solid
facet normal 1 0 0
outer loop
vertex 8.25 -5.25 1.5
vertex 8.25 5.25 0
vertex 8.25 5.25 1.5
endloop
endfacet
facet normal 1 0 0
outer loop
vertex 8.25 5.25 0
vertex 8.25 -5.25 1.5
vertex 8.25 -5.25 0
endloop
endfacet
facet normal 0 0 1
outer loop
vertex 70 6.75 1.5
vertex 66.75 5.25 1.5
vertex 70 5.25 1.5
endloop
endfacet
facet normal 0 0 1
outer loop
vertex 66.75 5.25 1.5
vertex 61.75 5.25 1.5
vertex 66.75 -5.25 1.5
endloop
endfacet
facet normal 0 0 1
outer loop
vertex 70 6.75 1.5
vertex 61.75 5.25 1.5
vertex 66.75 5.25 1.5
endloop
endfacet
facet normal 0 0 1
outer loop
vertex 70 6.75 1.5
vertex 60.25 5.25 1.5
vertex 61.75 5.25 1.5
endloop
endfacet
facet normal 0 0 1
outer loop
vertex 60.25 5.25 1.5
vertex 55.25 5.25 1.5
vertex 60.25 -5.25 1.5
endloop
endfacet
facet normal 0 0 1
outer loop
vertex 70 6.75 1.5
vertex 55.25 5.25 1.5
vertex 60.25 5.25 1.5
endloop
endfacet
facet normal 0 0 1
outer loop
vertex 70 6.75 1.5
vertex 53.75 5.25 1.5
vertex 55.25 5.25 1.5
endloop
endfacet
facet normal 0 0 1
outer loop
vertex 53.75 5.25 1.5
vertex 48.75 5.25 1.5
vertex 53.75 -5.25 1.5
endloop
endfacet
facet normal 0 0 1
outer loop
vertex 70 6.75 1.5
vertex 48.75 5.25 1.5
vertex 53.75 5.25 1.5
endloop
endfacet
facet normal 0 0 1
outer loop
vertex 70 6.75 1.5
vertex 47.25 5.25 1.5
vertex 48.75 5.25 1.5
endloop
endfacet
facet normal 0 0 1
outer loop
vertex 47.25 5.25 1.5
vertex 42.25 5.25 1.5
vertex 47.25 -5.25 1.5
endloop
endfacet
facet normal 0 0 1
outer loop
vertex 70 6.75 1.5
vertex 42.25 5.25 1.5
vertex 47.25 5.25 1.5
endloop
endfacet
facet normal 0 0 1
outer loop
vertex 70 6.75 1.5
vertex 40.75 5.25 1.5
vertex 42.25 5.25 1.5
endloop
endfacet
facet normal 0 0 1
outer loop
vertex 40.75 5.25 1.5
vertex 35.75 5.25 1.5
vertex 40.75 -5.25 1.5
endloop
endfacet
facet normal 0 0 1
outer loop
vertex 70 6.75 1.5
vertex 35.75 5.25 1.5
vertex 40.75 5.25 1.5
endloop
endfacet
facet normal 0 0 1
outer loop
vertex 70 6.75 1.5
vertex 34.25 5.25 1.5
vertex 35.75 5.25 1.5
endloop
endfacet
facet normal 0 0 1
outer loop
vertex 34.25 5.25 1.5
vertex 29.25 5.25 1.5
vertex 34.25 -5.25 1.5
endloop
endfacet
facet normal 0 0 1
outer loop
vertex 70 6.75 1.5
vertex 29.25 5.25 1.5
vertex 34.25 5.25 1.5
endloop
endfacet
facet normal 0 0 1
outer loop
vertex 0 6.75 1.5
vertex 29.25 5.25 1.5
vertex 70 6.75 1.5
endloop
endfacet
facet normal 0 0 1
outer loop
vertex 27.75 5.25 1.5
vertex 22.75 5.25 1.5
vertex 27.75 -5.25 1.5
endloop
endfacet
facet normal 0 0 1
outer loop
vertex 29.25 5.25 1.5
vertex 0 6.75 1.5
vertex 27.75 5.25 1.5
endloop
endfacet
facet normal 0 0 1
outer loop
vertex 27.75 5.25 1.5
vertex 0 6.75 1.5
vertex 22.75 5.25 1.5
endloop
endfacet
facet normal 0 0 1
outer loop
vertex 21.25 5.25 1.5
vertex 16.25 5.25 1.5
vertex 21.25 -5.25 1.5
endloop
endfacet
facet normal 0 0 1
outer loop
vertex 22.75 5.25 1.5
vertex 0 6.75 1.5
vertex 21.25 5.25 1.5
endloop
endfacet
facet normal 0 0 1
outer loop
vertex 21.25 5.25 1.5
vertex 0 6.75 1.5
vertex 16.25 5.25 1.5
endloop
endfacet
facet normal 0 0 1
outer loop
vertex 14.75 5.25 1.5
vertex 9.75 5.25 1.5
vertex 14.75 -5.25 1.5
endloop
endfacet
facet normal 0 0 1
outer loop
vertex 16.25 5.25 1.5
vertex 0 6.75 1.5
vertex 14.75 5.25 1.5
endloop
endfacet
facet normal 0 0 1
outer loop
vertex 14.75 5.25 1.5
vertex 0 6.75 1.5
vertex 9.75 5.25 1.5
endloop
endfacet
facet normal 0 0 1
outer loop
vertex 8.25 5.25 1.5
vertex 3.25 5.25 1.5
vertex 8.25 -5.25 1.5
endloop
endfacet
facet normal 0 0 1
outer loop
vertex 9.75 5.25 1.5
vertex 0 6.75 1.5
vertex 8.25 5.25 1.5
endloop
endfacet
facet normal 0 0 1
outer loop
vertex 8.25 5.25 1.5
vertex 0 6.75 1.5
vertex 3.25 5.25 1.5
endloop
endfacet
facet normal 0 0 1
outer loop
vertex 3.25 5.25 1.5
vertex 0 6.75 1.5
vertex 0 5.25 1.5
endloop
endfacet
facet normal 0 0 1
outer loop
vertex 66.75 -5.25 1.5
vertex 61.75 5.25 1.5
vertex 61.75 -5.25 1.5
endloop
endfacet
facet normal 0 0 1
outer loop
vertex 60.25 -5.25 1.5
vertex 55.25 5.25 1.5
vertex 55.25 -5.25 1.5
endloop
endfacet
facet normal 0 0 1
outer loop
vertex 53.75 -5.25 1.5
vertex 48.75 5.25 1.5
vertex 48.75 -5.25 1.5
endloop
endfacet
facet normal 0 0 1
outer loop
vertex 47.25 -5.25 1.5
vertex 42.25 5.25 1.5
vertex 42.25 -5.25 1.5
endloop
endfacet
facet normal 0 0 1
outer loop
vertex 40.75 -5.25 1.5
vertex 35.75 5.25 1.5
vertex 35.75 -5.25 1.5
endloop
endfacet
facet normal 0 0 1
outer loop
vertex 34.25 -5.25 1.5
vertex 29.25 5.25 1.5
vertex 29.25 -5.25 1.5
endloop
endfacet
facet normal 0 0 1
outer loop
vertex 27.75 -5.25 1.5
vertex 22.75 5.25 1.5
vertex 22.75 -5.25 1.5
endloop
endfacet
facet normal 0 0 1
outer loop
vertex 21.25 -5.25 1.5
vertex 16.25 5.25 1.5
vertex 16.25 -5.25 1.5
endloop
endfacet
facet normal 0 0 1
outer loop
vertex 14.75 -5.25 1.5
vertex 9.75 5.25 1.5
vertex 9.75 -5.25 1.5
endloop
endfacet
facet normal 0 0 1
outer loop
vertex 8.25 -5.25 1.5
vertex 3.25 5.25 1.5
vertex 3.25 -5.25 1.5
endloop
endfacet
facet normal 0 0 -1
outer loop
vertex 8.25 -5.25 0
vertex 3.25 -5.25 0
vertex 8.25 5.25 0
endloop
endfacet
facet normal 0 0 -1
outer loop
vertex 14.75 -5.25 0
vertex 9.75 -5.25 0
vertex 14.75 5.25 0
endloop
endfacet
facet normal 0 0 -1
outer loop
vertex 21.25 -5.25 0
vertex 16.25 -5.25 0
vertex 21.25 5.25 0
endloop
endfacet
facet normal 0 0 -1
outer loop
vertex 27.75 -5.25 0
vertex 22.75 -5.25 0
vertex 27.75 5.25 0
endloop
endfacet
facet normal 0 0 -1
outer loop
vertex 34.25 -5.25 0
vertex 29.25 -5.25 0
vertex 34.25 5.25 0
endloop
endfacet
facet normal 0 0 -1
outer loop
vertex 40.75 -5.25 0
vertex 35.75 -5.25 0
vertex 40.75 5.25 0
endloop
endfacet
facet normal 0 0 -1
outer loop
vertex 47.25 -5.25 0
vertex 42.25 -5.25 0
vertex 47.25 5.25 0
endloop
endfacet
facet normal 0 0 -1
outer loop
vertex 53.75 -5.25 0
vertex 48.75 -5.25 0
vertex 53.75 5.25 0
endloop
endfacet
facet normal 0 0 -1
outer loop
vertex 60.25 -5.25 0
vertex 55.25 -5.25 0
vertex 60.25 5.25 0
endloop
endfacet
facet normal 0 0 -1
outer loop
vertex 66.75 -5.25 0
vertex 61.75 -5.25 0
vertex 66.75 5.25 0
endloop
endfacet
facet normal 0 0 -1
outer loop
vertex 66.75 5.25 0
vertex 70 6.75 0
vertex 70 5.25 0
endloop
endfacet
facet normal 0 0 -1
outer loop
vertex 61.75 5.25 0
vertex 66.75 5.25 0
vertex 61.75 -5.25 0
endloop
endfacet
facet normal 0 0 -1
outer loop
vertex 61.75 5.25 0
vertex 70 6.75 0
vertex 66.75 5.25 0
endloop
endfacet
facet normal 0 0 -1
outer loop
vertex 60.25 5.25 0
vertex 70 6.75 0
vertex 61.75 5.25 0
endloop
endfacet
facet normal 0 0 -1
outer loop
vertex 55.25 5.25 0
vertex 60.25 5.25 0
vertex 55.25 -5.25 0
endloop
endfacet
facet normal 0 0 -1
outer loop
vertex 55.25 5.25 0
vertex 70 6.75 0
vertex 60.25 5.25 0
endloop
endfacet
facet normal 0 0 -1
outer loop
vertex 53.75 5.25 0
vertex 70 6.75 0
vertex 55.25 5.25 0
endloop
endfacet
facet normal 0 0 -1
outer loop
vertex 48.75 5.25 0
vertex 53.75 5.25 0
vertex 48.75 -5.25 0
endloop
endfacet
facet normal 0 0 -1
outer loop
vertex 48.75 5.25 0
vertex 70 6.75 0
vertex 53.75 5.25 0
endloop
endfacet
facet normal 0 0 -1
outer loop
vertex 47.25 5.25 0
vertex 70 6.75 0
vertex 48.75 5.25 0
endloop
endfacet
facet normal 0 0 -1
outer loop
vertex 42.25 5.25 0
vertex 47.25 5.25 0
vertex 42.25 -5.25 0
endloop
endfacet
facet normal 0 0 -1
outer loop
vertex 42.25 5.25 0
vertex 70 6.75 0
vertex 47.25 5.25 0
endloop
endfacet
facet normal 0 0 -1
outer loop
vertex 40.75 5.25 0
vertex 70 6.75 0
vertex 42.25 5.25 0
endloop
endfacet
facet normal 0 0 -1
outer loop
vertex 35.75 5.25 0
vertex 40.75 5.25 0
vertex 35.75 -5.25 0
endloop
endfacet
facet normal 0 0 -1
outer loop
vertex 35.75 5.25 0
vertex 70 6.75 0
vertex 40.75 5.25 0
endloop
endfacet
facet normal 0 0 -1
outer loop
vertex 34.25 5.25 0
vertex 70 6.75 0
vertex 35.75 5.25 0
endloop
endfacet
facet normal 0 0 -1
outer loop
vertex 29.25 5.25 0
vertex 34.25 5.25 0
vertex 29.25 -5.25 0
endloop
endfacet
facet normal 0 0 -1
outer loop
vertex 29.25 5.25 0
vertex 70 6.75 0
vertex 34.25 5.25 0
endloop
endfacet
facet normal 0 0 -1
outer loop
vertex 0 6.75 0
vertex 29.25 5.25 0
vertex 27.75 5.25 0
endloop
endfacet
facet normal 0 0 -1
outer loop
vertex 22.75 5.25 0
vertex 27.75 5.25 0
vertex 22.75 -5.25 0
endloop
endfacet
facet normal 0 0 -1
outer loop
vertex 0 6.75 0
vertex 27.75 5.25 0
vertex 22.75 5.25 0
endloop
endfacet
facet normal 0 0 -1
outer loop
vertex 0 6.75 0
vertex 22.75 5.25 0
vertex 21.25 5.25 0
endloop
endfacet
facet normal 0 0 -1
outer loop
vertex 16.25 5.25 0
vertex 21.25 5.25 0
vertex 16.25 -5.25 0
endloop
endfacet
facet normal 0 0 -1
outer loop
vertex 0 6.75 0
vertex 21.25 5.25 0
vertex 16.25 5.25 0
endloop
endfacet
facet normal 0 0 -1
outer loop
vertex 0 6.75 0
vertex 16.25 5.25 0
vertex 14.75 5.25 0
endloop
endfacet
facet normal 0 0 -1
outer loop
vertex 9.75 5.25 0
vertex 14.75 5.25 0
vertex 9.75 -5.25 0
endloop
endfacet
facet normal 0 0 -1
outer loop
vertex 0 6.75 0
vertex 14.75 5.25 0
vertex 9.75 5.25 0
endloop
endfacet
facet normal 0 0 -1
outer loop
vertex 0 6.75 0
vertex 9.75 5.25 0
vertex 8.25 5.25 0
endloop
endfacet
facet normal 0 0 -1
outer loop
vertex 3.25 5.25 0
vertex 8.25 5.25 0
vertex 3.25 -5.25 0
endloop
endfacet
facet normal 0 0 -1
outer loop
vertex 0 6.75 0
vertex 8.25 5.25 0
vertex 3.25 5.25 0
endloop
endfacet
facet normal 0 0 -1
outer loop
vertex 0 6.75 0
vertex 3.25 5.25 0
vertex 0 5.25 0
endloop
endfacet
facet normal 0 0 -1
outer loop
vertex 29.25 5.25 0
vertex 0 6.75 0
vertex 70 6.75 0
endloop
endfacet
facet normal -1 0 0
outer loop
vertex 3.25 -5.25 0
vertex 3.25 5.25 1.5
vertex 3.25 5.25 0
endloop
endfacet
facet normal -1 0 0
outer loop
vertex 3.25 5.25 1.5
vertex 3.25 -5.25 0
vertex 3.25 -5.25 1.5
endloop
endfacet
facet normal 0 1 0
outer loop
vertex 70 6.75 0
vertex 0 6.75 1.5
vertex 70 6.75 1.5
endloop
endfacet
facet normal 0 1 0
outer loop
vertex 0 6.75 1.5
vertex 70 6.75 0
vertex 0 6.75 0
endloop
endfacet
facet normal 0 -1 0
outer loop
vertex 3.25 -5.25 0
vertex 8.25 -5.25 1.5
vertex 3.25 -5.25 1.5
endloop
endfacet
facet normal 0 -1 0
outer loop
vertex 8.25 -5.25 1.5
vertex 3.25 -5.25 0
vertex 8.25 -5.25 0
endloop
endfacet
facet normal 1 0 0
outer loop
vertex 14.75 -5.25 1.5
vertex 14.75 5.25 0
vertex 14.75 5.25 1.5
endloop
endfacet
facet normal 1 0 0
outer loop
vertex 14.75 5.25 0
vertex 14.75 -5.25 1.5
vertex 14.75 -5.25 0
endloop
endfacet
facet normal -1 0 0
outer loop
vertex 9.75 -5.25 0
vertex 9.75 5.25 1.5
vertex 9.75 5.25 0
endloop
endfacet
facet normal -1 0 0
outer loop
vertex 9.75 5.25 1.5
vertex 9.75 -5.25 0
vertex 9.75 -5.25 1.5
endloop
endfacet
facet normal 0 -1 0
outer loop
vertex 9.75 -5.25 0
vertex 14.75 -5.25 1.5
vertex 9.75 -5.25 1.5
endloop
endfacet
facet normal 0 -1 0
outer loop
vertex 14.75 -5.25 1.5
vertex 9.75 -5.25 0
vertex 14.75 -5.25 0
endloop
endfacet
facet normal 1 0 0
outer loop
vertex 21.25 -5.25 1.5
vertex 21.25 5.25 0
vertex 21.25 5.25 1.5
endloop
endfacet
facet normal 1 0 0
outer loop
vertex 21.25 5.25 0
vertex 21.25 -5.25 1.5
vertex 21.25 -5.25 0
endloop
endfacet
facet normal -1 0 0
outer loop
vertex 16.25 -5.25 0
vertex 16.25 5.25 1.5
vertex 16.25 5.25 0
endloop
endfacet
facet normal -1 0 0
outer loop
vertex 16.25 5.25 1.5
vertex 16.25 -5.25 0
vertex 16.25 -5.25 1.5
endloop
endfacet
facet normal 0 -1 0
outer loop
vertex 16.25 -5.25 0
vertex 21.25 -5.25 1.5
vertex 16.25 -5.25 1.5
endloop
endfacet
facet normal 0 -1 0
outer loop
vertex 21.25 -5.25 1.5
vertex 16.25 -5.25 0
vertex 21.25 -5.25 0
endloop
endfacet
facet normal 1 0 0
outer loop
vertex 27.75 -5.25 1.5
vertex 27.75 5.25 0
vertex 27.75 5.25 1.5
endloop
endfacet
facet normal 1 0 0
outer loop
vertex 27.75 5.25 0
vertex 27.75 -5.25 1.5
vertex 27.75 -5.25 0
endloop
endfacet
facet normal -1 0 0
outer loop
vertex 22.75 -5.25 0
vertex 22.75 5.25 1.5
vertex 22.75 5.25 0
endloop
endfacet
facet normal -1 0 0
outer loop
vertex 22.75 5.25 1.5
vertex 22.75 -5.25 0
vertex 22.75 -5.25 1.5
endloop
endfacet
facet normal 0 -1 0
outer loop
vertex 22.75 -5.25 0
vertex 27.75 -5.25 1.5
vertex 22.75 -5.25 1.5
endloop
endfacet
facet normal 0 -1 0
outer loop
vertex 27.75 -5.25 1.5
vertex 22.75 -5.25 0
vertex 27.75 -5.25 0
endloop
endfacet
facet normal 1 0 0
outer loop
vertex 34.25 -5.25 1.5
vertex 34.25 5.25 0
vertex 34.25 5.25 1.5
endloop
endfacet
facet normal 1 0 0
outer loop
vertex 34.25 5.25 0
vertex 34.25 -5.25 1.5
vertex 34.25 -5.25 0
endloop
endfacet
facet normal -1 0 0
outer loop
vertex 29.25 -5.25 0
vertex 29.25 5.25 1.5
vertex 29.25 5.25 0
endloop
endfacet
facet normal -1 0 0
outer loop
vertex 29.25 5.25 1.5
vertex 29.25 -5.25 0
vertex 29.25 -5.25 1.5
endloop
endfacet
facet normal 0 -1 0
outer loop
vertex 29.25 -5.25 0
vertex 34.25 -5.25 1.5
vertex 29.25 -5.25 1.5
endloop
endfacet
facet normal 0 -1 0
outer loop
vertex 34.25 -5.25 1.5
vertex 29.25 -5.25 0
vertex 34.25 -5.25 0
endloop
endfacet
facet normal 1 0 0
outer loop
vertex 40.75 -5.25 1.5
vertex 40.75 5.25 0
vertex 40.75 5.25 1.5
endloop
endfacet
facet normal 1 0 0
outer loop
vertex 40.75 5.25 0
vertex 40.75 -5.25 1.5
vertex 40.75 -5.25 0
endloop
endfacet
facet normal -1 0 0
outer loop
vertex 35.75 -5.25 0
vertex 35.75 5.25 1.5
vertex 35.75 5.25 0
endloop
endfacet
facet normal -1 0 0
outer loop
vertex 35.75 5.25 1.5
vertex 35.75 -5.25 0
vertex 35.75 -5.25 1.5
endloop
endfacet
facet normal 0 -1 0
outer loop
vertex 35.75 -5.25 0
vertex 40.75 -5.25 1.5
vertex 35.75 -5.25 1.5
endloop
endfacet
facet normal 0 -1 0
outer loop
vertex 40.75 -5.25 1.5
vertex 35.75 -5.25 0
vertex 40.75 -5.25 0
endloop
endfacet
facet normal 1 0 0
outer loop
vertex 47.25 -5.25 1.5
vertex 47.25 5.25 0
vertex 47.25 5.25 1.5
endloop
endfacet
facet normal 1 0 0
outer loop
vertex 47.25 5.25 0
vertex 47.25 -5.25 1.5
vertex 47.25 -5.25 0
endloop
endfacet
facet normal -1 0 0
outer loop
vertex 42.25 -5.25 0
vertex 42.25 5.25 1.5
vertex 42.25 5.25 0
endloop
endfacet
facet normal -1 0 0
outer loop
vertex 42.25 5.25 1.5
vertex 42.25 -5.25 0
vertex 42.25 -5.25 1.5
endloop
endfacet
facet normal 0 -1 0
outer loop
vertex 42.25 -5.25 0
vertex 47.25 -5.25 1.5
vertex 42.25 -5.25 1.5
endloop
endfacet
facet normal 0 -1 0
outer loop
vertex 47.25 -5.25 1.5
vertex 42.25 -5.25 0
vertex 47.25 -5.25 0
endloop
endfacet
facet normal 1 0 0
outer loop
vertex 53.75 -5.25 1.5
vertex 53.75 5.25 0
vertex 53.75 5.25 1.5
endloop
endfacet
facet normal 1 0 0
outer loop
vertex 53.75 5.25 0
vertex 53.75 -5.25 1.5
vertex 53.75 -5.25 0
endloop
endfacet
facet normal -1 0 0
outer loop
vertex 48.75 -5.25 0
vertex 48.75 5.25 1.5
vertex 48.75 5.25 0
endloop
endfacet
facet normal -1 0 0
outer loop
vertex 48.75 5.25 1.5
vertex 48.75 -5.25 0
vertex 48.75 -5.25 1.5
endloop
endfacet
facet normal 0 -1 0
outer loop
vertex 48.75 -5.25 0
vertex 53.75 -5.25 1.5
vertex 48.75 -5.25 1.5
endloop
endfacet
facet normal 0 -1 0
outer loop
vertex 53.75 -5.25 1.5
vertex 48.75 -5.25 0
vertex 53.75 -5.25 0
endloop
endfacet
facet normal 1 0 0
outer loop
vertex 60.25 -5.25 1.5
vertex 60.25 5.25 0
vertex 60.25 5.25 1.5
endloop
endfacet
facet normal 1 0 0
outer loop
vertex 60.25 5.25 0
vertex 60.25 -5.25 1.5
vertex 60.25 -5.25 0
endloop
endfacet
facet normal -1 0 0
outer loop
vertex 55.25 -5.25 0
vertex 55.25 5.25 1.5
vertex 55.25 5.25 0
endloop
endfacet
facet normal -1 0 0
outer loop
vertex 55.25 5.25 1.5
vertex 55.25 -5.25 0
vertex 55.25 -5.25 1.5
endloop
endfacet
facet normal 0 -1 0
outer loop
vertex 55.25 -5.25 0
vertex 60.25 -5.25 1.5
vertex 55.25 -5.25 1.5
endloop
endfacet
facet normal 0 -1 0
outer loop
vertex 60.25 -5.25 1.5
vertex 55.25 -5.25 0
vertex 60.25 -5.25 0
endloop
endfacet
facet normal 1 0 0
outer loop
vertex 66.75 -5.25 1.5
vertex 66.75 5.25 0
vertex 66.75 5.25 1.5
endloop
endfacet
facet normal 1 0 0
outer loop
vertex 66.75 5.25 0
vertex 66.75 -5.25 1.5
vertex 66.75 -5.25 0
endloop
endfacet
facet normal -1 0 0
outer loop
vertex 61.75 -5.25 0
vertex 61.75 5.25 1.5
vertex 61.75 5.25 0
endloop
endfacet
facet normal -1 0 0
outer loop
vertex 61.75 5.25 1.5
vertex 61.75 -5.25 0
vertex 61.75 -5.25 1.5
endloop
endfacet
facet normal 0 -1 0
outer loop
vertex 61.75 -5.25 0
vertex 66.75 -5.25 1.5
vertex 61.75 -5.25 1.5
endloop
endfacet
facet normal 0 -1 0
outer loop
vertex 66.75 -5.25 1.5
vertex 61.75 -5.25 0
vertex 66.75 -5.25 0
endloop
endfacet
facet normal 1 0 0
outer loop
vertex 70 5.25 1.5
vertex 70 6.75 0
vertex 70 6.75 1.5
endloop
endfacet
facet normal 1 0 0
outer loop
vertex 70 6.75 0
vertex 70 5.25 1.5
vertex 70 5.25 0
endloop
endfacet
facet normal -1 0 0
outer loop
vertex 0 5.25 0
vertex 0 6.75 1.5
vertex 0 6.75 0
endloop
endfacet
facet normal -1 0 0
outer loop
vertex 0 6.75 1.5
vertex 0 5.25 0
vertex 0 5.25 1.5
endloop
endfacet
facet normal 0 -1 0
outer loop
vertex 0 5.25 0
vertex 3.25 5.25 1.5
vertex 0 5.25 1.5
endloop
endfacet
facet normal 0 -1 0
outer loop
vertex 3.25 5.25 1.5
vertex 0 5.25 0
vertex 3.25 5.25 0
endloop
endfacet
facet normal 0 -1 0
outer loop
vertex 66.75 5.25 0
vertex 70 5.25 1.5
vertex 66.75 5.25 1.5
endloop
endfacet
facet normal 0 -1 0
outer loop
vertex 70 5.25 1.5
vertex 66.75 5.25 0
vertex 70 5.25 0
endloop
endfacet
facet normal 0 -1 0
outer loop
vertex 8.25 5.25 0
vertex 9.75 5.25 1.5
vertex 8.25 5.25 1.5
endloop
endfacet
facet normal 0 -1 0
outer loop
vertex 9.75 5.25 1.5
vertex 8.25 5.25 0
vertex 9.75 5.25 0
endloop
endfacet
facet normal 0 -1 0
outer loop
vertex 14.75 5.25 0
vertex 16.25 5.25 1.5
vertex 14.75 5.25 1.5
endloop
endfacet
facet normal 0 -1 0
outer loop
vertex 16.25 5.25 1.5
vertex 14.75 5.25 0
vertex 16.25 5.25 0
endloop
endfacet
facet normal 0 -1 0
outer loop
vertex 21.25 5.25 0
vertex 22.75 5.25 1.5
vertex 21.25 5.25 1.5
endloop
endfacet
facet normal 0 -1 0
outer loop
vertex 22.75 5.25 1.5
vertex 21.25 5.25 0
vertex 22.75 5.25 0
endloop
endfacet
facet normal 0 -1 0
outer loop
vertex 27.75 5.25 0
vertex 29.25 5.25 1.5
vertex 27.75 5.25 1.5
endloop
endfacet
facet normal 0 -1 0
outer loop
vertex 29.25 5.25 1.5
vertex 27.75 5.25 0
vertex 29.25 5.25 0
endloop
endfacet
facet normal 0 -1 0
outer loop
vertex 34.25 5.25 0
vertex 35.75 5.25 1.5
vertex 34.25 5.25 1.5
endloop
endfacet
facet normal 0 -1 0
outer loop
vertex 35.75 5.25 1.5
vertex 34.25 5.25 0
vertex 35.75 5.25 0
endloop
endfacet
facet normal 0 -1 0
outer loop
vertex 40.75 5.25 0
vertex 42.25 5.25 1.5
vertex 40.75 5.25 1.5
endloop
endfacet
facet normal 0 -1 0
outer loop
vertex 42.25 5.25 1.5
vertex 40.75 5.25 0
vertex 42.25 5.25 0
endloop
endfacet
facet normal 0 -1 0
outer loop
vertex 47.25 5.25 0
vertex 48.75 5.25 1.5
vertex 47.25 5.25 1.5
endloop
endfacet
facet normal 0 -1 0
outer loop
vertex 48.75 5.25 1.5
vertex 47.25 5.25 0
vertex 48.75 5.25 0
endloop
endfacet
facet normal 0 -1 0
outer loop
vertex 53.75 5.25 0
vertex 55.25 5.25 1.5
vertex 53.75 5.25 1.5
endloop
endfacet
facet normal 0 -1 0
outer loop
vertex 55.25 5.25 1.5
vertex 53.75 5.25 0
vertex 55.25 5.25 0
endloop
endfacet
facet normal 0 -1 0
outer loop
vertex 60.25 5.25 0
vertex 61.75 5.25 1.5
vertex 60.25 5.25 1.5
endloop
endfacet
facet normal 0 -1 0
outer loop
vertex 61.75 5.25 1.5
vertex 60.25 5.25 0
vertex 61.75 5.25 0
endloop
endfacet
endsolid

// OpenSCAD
// 10-well comb for agarose gel casting
// Print orientation: lying flat on XY plane (Z = 0), builds upward (+Z)

// Dimensions
thickness = 1.5;        // Total thickness (Z)
spine_length = 70;      // Spine length (X)
spine_width = 12;       // Spine width (Y)
num_wells = 10;         // Number of teeth/wells
tooth_width = 5.0;      // Width of each tooth (X)
tooth_length = 12;      // Length of each tooth (Y)
gap_width = 1.5;        // Gap between neighbouring teeth (X)

// Calculations
total_tooth_width = num_wells * tooth_width;
total_gap_width = (num_wells - 1) * gap_width;
total_tooth_and_gap_width = total_tooth_width + total_gap_width;
spine_center_x = spine_length / 2;
tooth_row_start_x = spine_center_x - total_tooth_and_gap_width / 2;

// Comb construction
module comb() {
    // Spine (base plate)
    translate([0, (spine_width - thickness) / 2, 0])
        cube([spine_length, thickness, thickness]);
    
    // Teeth (wells)
    for (i = [0 : num_wells - 1]) {
        // Calculate X position of each tooth
        tooth_x = tooth_row_start_x + i * (tooth_width + gap_width);
        
        // Position tooth: X from spine center, Y extends in -Y direction from spine edge
        // Spine edge is at Y = spine_width/2 + thickness/2 (outer edge of spine)
        // Tooth extends from spine edge in -Y direction for tooth_length
        translate([tooth_x, spine_width/2 + thickness/2 - tooth_length, 0])
            cube([tooth_width, tooth_length, thickness]);
    }
}

// Build the comb
comb();
